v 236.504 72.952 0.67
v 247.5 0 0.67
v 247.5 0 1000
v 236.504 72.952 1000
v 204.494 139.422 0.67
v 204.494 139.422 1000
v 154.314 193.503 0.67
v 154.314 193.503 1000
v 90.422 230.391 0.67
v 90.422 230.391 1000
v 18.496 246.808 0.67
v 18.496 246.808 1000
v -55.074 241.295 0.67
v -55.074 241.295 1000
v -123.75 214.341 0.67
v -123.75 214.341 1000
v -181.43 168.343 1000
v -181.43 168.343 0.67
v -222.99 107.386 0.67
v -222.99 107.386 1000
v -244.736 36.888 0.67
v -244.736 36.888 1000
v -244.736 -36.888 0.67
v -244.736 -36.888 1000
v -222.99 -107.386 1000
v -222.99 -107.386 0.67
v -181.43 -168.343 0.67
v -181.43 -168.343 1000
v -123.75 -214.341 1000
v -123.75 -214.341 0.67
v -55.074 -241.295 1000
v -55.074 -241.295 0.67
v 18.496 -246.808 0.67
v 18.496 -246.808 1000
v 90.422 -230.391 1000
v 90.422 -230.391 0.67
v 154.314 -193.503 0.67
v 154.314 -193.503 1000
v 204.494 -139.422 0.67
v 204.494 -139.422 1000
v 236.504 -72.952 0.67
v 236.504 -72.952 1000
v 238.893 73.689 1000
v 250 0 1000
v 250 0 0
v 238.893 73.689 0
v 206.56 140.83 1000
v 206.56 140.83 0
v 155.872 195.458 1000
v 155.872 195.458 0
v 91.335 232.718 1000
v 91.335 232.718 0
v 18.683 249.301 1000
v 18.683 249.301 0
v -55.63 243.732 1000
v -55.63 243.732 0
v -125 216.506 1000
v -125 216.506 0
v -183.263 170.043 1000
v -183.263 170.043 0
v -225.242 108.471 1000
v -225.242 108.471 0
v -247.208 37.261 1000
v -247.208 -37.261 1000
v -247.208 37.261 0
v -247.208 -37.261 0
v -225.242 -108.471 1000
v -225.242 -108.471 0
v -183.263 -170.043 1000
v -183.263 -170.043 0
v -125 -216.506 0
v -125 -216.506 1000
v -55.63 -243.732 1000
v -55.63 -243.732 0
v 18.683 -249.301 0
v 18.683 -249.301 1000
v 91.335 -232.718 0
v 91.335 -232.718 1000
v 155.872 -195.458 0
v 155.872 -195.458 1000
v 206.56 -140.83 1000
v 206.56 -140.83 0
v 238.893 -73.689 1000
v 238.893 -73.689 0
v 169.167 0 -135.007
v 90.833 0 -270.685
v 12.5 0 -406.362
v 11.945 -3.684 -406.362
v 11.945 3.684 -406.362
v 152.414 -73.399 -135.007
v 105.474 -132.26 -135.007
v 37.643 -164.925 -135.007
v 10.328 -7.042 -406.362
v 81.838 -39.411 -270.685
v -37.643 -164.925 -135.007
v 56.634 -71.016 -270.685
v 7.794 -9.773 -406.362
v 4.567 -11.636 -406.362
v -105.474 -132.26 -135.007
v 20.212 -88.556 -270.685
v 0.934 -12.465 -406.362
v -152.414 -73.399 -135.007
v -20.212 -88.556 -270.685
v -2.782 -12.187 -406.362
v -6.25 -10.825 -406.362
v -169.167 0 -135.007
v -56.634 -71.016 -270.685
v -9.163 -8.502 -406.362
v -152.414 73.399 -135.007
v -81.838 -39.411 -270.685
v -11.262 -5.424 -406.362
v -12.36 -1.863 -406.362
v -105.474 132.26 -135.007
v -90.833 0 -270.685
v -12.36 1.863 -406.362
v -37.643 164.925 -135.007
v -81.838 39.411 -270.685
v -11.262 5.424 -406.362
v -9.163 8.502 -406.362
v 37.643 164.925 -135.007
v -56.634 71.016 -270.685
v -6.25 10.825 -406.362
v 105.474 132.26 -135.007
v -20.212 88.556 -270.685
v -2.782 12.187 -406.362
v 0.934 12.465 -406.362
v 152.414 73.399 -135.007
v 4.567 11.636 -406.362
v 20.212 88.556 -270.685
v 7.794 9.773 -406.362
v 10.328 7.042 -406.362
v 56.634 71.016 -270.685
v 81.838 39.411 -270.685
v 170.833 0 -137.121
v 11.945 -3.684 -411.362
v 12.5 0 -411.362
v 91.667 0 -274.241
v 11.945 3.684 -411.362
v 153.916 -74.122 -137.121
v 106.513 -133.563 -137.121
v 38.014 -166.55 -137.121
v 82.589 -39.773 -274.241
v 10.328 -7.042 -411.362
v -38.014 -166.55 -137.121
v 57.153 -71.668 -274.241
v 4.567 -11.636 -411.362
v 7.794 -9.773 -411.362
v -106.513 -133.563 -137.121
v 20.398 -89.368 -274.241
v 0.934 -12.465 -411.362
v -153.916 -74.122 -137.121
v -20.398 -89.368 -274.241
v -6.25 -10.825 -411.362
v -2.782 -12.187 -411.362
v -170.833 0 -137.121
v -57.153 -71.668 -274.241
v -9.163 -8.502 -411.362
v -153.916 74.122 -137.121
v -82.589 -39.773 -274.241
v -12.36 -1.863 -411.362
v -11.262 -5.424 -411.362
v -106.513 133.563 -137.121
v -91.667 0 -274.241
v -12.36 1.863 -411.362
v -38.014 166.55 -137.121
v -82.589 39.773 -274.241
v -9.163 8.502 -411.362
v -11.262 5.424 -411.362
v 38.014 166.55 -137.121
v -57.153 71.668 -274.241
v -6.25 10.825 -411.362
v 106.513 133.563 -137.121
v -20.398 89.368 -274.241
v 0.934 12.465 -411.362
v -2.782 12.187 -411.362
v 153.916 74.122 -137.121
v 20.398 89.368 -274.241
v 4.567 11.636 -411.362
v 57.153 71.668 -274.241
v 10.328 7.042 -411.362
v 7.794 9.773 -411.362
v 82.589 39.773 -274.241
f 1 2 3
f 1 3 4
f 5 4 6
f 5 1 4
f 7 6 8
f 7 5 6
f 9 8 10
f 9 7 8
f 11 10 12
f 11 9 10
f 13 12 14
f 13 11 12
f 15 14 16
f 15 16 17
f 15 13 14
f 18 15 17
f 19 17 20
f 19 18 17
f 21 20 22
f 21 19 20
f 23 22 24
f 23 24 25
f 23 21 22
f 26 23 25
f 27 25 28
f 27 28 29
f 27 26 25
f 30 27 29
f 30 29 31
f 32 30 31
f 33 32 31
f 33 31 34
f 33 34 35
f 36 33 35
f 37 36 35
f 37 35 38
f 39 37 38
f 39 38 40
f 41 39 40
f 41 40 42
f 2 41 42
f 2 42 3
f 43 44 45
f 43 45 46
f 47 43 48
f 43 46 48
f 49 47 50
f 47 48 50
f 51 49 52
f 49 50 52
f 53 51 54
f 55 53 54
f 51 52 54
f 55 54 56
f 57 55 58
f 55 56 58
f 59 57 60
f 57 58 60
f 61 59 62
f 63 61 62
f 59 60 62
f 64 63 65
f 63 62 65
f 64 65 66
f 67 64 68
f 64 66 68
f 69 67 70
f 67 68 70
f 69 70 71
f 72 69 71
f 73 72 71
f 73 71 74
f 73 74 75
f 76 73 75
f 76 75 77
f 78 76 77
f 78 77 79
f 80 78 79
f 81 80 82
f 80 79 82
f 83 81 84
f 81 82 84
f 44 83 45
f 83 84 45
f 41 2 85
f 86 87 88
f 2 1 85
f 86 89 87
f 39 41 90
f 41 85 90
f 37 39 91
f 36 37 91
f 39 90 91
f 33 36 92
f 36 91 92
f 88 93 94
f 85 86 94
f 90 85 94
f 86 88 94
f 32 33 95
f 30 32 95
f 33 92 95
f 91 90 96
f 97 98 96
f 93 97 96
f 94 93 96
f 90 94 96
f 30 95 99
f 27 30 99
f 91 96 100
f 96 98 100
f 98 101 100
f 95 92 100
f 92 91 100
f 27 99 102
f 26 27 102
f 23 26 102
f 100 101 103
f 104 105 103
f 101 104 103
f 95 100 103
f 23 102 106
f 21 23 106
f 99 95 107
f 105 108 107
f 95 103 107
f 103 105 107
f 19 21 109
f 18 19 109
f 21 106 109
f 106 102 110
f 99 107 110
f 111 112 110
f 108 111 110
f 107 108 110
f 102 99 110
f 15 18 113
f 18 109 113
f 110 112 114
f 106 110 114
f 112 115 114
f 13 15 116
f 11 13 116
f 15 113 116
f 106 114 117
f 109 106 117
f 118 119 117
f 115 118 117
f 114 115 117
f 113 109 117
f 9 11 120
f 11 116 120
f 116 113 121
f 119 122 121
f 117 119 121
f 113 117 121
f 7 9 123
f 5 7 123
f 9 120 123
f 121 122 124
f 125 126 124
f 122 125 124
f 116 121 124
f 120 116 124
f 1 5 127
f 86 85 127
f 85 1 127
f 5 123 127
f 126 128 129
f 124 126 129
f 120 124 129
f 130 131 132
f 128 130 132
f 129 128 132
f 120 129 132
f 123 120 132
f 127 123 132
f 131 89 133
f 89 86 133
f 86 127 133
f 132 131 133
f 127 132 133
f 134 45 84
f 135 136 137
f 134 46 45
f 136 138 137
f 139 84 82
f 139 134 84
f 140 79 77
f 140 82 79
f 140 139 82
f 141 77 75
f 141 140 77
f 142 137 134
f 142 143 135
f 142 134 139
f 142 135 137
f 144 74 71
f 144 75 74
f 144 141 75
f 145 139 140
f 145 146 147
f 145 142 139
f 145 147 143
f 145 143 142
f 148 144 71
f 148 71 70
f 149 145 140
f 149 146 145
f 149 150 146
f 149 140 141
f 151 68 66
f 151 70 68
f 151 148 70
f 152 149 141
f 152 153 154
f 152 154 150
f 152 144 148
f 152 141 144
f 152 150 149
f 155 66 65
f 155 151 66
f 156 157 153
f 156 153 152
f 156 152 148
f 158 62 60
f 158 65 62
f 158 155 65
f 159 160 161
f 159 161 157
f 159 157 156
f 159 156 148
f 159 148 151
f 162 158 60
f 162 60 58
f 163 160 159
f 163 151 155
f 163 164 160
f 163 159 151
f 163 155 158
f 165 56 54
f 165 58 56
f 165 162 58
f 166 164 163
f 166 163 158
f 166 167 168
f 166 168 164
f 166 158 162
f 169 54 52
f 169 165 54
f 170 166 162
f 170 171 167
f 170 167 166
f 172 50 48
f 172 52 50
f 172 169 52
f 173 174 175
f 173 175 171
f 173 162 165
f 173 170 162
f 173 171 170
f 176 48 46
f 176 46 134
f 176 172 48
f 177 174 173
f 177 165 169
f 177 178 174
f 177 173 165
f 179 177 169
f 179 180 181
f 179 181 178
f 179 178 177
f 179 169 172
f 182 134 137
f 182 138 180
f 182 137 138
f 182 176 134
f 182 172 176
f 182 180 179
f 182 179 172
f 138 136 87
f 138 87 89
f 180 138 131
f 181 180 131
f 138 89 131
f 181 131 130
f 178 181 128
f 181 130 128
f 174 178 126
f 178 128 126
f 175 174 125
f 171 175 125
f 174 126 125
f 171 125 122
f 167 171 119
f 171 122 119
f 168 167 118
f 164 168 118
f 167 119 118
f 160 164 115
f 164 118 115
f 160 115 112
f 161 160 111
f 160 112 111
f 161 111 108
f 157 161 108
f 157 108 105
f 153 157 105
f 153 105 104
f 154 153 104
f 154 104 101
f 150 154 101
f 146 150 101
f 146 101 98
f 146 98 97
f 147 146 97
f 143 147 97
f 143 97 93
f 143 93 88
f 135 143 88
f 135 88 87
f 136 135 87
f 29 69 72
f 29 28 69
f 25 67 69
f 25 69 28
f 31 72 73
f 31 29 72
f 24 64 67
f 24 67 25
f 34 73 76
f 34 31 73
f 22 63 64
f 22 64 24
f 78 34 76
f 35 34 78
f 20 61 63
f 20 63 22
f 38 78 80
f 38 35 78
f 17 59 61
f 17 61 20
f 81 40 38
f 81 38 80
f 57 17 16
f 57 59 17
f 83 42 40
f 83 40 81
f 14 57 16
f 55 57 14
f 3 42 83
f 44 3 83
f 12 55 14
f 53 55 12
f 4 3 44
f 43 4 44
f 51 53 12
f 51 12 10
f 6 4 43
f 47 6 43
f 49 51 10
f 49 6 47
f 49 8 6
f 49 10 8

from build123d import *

# Parameters (mm, degrees)
F0_R     = 250
F1_DEPTH = 1000
F2_R     = 250
F4_T     = -2.5
F5_R     = 12.5
F6_DEPTH = 433.0137019922


# Not quite as in the source:
# - an extrude whose draft closes it to a point is written as a loft to that point


with BuildPart() as f1:
    # F0 (on Top) → F1 (new body)
    with BuildSketch(Plane.XY):
        Circle(F0_R)
    extrude(amount=F1_DEPTH)

    # F2 (on face) → F3 section 0
    with BuildSketch(Plane(origin=(0, 0, 0), x_dir=(1, 0, 0), z_dir=(0, 0, -1)), mode=Mode.PRIVATE) as f3_s0:
        Circle(F2_R)
    loft([f3_s0.sketch, Vertex(0, 0, -433.0127018922)], ruled=True)

    # F4
    f4_openings = [f1.faces().sort_by_distance(p)[0] for p in [
        (0, 0, 1000),
    ]]
    offset(amount=F4_T, openings=f4_openings)

    # F5 (on Top) → F6 (cut, through all)
    with BuildSketch(Plane.XY):
        Circle(F5_R)
    extrude(amount=-F6_DEPTH, mode=Mode.SUBTRACT)


solid = f1.part
